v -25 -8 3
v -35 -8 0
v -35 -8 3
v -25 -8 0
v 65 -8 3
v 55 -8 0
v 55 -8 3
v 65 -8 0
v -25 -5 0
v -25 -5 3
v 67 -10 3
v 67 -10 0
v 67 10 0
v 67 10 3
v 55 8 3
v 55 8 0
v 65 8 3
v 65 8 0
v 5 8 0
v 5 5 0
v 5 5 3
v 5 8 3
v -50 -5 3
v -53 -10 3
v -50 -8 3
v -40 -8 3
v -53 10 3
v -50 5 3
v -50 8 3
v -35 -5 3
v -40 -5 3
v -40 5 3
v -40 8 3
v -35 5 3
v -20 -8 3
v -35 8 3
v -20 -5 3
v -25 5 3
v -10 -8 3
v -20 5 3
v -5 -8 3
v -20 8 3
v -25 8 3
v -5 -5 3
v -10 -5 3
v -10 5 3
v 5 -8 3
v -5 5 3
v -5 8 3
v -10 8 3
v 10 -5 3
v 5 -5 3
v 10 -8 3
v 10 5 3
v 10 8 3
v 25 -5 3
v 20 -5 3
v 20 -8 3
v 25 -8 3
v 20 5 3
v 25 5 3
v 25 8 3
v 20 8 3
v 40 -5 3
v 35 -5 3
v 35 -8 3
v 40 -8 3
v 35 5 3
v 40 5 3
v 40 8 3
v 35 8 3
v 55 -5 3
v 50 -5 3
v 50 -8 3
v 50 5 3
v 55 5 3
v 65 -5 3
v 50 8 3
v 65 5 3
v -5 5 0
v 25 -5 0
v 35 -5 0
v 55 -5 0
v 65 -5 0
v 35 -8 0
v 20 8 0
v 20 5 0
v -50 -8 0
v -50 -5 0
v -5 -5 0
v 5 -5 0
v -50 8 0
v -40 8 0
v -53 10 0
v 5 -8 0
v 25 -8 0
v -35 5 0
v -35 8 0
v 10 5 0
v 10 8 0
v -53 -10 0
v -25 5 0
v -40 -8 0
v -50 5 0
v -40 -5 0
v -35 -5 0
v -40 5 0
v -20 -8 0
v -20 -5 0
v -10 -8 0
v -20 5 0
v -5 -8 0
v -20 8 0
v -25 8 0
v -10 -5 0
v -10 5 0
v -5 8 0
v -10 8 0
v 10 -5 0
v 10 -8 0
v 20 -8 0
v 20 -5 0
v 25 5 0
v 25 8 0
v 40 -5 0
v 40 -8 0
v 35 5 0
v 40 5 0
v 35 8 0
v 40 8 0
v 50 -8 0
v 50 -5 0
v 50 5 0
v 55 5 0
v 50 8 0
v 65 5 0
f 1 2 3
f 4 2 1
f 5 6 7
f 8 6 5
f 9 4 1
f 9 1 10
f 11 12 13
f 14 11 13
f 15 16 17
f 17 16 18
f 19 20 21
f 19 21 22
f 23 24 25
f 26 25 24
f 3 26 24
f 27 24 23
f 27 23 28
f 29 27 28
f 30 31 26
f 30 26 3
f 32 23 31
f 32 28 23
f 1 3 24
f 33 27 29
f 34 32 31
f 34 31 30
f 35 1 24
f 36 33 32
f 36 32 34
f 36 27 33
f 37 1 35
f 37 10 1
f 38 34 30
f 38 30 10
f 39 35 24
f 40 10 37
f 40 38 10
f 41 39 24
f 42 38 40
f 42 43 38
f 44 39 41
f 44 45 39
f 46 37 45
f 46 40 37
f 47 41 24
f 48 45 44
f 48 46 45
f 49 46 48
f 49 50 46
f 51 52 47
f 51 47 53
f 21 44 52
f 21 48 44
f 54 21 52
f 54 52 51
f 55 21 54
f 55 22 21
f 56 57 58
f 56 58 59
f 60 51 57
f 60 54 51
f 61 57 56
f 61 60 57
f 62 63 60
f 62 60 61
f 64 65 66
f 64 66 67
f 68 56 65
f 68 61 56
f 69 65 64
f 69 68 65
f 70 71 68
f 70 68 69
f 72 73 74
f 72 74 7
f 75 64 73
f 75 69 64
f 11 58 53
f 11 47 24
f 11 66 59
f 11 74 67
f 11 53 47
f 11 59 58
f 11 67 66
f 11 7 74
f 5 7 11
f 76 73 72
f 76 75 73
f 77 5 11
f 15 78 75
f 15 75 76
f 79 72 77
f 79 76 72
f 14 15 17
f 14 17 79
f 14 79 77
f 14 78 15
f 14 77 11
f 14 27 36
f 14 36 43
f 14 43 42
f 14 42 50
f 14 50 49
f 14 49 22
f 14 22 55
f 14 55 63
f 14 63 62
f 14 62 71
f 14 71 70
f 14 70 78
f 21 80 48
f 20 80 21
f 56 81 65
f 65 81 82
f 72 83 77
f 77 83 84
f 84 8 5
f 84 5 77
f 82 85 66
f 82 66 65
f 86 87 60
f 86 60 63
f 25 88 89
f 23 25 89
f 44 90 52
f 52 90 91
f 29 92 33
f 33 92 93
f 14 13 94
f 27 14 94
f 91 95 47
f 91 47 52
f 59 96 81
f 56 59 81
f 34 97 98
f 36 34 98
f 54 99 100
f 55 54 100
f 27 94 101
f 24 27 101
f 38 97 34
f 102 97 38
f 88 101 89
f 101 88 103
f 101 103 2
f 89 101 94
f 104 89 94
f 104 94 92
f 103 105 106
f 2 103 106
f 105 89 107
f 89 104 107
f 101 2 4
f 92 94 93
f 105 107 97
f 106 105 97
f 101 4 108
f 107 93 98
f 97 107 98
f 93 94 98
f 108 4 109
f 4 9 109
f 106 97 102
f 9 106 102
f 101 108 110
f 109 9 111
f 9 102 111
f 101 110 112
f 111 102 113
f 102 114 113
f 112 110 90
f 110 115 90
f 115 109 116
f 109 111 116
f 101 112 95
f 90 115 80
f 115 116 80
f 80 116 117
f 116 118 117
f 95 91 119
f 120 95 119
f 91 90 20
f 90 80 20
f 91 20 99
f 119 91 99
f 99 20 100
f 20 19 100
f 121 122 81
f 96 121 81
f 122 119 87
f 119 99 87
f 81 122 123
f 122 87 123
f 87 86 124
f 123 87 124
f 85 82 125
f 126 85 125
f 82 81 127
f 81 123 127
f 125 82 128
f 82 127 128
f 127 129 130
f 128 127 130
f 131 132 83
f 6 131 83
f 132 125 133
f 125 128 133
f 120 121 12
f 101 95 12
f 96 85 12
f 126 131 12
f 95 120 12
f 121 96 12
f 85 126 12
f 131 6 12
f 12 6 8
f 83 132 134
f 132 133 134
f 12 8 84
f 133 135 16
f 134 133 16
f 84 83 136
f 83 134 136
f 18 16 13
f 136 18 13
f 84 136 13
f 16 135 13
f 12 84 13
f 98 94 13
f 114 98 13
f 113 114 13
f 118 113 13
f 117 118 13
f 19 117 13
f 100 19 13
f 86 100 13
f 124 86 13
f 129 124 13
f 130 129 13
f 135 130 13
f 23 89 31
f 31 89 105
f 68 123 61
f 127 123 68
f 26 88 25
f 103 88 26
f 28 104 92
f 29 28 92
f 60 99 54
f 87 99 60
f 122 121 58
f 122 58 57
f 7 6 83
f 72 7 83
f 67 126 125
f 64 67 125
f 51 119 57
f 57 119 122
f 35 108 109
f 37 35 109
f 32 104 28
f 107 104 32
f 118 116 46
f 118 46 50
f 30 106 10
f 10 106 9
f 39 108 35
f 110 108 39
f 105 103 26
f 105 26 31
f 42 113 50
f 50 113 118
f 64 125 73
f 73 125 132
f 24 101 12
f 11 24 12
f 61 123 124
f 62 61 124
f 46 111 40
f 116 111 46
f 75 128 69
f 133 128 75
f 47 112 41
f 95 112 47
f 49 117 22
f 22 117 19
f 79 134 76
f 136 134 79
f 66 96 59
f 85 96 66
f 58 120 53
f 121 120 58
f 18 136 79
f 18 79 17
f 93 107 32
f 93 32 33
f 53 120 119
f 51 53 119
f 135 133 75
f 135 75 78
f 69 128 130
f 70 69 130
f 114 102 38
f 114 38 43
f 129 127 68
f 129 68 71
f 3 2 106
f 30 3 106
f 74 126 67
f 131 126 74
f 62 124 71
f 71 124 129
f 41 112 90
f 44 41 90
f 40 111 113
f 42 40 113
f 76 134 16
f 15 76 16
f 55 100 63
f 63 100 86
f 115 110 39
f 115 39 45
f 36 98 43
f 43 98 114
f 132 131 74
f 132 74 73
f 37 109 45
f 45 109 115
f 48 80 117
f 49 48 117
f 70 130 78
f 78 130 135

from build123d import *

# Parameters (mm, degrees)
SKETCH_1_W      = 10
SKETCH_1_H      = 3
EXTRUDE_1_DEPTH = 3


with BuildPart() as part:
    # 草图1 → 凸台-拉伸1 (new body)
    with BuildSketch(Plane.XY):
        Polygon((-53, 5), (-53, -5), (-53, -10), (67, -10), (67, -5), (67, 5), (67, 10), (-53, 10), align=None)
        with Locations((-30, 6.5)):
            Rectangle(SKETCH_1_W, SKETCH_1_H, mode=Mode.SUBTRACT)
        with Locations((-45, 6.5)):
            Rectangle(SKETCH_1_W, SKETCH_1_H, mode=Mode.SUBTRACT)
        with Locations((-15, 6.5)):
            Rectangle(SKETCH_1_W, SKETCH_1_H, mode=Mode.SUBTRACT)
        with Locations((0, 6.5)):
            Rectangle(SKETCH_1_W, SKETCH_1_H, mode=Mode.SUBTRACT)
        with Locations((15, 6.5)):
            Rectangle(SKETCH_1_W, SKETCH_1_H, mode=Mode.SUBTRACT)
        with Locations((30, 6.5)):
            Rectangle(SKETCH_1_W, SKETCH_1_H, mode=Mode.SUBTRACT)
        with Locations((45, 6.5)):
            Rectangle(SKETCH_1_W, SKETCH_1_H, mode=Mode.SUBTRACT)
        with Locations((45, -6.5)):
            Rectangle(SKETCH_1_W, SKETCH_1_H, mode=Mode.SUBTRACT)
        with Locations((30, -6.5)):
            Rectangle(SKETCH_1_W, SKETCH_1_H, mode=Mode.SUBTRACT)
        with Locations((15, -6.5)):
            Rectangle(SKETCH_1_W, SKETCH_1_H, mode=Mode.SUBTRACT)
        with Locations((0, -6.5)):
            Rectangle(SKETCH_1_W, SKETCH_1_H, mode=Mode.SUBTRACT)
        with Locations((-15, -6.5)):
            Rectangle(SKETCH_1_W, SKETCH_1_H, mode=Mode.SUBTRACT)
        with Locations((-30, -6.5)):
            Rectangle(SKETCH_1_W, SKETCH_1_H, mode=Mode.SUBTRACT)
        with Locations((-45, -6.5)):
            Rectangle(SKETCH_1_W, SKETCH_1_H, mode=Mode.SUBTRACT)
        with Locations((60, 6.5)):
            Rectangle(SKETCH_1_W, SKETCH_1_H, mode=Mode.SUBTRACT)
        with Locations((60, -6.5)):
            Rectangle(SKETCH_1_W, SKETCH_1_H, mode=Mode.SUBTRACT)
    extrude(amount=EXTRUDE_1_DEPTH)


solid = part.part
